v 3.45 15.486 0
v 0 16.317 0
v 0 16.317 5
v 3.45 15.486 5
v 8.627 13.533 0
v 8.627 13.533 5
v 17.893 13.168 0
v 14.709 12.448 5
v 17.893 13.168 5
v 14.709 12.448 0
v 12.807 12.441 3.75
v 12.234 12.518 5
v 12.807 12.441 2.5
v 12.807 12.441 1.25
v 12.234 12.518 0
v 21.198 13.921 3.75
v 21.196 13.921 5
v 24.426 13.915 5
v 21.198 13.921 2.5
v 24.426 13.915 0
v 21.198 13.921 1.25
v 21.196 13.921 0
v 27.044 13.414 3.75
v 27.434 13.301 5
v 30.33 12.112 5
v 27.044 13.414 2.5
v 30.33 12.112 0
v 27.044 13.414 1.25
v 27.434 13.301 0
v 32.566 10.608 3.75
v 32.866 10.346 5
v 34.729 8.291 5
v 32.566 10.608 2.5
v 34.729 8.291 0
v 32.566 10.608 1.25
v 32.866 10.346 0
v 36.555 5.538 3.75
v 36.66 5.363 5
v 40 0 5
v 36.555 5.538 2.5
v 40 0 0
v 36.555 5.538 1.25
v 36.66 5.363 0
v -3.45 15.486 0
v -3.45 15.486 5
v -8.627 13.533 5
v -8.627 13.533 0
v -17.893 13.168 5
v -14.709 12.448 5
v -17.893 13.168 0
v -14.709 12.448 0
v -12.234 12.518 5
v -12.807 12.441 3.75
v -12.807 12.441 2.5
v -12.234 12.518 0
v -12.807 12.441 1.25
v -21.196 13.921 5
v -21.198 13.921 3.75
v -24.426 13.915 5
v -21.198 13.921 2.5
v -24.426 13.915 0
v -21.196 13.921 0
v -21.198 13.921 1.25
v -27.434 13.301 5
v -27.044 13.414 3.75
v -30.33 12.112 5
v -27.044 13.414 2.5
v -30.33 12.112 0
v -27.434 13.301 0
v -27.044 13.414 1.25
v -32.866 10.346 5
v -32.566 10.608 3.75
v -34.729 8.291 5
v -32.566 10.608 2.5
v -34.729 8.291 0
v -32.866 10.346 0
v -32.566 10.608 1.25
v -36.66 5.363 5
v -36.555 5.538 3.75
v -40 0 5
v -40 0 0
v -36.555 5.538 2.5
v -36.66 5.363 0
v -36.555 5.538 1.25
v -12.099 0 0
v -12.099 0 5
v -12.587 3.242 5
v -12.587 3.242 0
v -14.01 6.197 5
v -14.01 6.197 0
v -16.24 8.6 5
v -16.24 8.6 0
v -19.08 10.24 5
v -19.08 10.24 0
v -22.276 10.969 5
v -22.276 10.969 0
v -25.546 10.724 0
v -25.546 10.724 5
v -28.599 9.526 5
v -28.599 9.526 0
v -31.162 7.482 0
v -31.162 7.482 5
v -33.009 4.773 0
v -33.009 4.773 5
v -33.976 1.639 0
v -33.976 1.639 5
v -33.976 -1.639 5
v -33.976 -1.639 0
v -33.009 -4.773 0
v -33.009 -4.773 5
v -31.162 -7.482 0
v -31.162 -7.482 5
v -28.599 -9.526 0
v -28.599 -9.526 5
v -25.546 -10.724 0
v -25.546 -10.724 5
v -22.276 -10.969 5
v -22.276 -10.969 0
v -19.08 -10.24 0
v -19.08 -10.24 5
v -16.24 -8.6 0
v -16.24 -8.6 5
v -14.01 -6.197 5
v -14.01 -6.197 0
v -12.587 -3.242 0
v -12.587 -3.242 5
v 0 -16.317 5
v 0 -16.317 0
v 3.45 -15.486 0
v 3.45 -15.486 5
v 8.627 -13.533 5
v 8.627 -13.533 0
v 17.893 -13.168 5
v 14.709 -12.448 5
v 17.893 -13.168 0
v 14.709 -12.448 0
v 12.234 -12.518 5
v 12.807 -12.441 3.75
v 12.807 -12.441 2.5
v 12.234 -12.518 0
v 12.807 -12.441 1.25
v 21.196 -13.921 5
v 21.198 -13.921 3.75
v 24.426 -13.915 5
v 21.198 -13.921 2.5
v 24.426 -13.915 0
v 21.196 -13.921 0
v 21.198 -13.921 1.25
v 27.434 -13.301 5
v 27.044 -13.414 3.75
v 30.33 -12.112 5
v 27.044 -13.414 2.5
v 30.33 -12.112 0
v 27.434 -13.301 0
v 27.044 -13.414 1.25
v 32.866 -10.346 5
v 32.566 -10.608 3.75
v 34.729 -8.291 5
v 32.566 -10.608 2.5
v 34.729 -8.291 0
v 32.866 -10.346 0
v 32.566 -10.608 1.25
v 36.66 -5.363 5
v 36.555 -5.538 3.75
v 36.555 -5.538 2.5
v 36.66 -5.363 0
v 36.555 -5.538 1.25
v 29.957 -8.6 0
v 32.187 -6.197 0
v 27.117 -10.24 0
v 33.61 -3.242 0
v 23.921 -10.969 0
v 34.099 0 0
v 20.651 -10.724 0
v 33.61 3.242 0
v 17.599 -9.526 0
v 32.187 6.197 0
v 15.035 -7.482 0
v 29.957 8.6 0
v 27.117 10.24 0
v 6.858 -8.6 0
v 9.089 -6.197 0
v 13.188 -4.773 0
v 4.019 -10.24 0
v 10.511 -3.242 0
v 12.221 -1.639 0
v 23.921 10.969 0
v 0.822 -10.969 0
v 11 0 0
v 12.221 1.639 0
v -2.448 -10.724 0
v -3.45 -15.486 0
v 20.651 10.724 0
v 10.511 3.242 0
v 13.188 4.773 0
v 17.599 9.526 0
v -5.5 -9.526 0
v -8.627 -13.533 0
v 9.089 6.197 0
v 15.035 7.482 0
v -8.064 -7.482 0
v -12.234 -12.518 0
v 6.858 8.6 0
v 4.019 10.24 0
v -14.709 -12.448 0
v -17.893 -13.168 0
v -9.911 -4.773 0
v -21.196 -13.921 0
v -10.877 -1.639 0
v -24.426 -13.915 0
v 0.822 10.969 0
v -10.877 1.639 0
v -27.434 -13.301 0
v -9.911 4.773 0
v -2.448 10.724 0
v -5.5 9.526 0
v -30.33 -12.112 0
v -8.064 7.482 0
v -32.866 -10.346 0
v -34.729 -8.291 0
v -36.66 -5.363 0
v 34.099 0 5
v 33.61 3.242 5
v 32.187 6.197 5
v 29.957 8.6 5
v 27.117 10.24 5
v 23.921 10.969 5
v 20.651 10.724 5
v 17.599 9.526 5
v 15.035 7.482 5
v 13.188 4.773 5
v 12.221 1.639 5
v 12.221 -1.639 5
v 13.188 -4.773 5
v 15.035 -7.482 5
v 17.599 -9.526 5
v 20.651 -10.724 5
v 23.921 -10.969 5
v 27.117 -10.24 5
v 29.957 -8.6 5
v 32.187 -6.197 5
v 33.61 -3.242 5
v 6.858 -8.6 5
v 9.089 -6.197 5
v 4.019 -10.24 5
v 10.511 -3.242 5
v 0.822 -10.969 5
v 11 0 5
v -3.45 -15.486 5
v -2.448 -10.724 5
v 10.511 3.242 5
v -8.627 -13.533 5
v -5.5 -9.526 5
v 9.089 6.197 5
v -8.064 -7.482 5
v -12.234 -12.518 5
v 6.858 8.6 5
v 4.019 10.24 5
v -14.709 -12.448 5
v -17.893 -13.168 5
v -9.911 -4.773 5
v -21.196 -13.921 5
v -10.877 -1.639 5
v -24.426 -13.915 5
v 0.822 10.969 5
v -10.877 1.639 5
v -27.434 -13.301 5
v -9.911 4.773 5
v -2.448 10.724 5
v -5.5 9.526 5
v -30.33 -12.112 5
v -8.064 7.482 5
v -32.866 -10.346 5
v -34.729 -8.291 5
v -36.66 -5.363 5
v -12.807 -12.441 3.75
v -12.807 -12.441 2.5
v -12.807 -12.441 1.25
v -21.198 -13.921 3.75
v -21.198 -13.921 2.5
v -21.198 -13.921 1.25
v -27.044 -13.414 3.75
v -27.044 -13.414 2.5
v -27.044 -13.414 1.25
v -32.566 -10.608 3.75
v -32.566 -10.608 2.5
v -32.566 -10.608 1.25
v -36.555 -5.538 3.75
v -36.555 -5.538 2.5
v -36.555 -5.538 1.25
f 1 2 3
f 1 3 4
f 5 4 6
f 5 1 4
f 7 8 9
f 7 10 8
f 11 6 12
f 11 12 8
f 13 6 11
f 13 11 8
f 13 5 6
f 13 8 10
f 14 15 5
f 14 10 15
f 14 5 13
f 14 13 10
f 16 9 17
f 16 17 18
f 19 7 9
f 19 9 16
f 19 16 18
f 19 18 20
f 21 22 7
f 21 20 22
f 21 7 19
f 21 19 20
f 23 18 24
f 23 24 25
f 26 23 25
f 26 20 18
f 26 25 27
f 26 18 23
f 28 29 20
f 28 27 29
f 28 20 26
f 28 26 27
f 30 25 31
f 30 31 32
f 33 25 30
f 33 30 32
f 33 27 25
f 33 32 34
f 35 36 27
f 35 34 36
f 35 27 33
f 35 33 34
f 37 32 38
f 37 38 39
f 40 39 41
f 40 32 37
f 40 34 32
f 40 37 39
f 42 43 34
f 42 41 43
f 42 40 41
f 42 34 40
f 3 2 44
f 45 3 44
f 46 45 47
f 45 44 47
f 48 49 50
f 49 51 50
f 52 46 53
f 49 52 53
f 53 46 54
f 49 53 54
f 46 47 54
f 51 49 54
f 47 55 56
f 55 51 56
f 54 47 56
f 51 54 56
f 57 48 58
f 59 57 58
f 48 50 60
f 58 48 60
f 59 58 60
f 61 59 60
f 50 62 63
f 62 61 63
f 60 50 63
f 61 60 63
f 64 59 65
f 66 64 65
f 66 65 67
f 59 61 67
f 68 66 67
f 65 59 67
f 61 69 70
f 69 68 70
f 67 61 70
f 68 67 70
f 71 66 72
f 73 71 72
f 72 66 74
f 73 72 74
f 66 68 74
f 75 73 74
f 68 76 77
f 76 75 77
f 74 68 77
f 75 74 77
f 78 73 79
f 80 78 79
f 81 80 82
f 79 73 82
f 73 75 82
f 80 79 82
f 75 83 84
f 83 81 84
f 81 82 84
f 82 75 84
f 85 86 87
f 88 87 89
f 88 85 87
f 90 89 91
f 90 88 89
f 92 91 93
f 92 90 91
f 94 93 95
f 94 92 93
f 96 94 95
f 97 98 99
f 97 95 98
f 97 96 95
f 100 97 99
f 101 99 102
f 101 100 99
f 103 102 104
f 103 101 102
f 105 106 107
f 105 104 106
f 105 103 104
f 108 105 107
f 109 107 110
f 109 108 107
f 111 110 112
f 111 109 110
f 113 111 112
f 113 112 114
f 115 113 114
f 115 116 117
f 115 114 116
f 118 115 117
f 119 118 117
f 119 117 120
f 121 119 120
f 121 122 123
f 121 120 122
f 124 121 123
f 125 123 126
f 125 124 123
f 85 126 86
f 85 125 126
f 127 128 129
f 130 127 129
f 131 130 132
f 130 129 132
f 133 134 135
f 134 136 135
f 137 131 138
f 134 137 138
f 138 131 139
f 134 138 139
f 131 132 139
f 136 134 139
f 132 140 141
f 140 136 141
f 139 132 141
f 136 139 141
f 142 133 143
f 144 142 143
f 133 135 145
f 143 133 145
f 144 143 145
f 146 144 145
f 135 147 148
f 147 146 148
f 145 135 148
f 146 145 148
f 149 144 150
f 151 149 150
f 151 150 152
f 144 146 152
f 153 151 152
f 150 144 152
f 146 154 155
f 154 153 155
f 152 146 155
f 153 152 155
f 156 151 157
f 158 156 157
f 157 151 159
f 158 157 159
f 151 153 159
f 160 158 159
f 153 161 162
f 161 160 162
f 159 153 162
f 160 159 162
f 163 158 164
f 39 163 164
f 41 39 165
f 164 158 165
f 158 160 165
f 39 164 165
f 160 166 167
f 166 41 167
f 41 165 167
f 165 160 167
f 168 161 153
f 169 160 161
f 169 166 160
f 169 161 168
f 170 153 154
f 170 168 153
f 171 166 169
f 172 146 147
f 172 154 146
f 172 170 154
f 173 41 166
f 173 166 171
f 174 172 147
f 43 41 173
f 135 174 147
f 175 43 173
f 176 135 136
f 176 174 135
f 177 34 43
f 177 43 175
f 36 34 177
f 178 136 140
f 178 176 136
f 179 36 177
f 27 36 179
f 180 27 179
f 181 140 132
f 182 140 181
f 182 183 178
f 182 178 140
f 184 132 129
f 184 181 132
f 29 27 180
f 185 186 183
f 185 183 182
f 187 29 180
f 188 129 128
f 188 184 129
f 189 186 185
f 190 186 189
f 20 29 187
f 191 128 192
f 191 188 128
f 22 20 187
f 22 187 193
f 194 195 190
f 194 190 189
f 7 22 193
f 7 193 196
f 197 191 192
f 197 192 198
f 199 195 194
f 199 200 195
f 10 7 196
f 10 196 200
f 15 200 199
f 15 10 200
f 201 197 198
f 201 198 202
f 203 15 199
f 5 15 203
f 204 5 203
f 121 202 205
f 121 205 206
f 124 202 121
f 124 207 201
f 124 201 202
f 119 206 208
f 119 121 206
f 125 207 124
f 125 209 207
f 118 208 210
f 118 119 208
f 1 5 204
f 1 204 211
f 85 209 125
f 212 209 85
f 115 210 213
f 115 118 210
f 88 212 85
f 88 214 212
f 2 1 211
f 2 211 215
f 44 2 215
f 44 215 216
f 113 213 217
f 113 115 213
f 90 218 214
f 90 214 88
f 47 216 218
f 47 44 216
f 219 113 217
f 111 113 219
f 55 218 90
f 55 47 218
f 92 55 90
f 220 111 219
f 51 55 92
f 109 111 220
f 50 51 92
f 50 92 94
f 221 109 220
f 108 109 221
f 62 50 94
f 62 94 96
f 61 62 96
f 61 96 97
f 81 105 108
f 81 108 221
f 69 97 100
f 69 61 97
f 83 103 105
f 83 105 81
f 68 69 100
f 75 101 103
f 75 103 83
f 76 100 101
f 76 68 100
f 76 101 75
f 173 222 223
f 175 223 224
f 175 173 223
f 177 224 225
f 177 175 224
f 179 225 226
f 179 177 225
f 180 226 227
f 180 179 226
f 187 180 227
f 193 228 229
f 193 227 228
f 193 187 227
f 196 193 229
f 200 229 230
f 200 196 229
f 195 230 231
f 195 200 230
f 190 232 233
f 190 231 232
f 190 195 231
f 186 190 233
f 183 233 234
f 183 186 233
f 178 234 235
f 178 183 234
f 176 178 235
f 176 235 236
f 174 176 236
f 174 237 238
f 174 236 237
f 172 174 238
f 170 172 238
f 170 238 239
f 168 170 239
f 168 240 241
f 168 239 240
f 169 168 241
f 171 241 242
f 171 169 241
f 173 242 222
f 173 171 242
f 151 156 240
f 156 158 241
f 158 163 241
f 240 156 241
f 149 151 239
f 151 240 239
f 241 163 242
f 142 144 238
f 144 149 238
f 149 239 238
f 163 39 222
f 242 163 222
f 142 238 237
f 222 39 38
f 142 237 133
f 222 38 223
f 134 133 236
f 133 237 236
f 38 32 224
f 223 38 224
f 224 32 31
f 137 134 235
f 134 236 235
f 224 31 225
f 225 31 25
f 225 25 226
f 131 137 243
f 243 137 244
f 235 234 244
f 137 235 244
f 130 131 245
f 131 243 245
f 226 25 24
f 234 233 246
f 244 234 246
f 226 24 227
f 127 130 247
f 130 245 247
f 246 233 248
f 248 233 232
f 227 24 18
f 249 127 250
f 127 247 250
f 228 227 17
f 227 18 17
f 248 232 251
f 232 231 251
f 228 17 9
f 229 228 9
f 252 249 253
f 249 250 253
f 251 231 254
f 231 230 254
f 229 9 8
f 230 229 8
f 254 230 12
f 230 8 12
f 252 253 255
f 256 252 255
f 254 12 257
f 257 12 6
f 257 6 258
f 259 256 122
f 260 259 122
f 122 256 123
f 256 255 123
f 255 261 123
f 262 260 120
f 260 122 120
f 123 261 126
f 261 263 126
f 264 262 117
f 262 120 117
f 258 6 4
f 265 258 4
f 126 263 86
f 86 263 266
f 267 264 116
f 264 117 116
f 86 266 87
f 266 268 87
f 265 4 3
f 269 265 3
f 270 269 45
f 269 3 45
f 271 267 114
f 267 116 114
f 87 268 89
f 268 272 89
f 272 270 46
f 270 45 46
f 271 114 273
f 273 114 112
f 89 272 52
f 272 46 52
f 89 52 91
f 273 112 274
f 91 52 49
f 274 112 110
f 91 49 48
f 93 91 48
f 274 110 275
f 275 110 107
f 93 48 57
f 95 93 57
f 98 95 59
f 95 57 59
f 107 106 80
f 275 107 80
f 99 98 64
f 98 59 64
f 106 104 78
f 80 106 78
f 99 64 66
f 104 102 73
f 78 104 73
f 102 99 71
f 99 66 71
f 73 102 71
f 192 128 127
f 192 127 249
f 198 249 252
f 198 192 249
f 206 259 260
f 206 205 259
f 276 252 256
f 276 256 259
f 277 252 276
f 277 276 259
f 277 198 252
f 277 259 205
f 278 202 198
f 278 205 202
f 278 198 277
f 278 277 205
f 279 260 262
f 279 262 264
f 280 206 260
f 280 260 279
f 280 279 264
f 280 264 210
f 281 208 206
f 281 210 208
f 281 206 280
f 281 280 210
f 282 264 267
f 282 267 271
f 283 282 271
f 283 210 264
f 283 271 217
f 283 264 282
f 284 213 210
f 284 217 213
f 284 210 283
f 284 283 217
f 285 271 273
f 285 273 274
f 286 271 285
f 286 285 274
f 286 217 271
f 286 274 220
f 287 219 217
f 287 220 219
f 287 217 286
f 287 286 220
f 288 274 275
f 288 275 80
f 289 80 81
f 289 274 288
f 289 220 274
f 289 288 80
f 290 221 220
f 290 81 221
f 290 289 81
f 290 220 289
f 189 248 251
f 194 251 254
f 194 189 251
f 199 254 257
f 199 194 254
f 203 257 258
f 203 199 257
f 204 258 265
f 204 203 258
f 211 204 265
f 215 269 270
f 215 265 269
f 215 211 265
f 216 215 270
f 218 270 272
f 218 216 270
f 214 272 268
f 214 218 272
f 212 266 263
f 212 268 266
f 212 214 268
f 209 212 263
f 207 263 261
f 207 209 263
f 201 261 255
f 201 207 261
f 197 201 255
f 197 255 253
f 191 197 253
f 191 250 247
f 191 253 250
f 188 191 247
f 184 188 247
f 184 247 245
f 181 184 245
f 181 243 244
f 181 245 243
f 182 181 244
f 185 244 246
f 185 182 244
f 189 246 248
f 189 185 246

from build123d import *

# Parameters (mm, degrees)
F2_DEPTH = 5
F1_R     = 11
F3_DEPTH = 25


with BuildPart() as f2:
    # F0 (on Top) → F2 (new body)
    with BuildSketch(Plane.XY):
        with BuildLine():
            add(Edge.make_bspline(
                [(0, 16.3166696827), (3.5657212598, 16.0403345339), (13.133146472, 10.3009581446), (20.8077415202, 15.270765109), (34.3109333985, 12.1061073272), (37.4478100235, 3.3879376446), (40, 0)],
                knots=[0, 0, 0, 0, 0.268631369, 0.4829909698, 0.7356900098, 1, 1, 1, 1], degree=3))
            add(Edge.make_bspline(
                [(0, 16.3166696827), (-3.5657212598, 16.0403345339), (-13.133146472, 10.3009581446), (-20.8077415202, 15.270765109), (-34.3109333985, 12.1061073272), (-37.4478100235, 3.3879376446), (-40, 0)],
                knots=[0, 0, 0, 0, 0.268631369, 0.4829909698, 0.7356900098, 1, 1, 1, 1], degree=3))
            add(Edge.make_bspline(
                [(0, -16.3166696827), (-3.5657212598, -16.0403345339), (-13.133146472, -10.3009581446), (-20.8077415202, -15.270765109), (-34.3109333985, -12.1061073272), (-37.4478100235, -3.3879376446), (-40, 0)],
                knots=[0, 0, 0, 0, 0.268631369, 0.4829909698, 0.7356900098, 1, 1, 1, 1], degree=3))
            add(Edge.make_bspline(
                [(0, -16.3166696827), (3.5657212598, -16.0403345339), (13.133146472, -10.3009581446), (20.8077415202, -15.270765109), (34.3109333985, -12.1061073272), (37.4478100235, -3.3879376446), (40, 0)],
                knots=[0, 0, 0, 0, 0.268631369, 0.4829909698, 0.7356900098, 1, 1, 1, 1], degree=3))
        make_face()
    extrude(amount=F2_DEPTH)

    # F1 (on Top) → F3 (cut)
    with BuildSketch(Plane.XY):
        Circle(F1_R)
        with Locations((-23.0985227972, 0)):
            Circle(F1_R)
        with Locations((23.0985227972, 0)):
            Circle(F1_R)
    extrude(amount=F3_DEPTH, mode=Mode.SUBTRACT)


solid = f2.part
